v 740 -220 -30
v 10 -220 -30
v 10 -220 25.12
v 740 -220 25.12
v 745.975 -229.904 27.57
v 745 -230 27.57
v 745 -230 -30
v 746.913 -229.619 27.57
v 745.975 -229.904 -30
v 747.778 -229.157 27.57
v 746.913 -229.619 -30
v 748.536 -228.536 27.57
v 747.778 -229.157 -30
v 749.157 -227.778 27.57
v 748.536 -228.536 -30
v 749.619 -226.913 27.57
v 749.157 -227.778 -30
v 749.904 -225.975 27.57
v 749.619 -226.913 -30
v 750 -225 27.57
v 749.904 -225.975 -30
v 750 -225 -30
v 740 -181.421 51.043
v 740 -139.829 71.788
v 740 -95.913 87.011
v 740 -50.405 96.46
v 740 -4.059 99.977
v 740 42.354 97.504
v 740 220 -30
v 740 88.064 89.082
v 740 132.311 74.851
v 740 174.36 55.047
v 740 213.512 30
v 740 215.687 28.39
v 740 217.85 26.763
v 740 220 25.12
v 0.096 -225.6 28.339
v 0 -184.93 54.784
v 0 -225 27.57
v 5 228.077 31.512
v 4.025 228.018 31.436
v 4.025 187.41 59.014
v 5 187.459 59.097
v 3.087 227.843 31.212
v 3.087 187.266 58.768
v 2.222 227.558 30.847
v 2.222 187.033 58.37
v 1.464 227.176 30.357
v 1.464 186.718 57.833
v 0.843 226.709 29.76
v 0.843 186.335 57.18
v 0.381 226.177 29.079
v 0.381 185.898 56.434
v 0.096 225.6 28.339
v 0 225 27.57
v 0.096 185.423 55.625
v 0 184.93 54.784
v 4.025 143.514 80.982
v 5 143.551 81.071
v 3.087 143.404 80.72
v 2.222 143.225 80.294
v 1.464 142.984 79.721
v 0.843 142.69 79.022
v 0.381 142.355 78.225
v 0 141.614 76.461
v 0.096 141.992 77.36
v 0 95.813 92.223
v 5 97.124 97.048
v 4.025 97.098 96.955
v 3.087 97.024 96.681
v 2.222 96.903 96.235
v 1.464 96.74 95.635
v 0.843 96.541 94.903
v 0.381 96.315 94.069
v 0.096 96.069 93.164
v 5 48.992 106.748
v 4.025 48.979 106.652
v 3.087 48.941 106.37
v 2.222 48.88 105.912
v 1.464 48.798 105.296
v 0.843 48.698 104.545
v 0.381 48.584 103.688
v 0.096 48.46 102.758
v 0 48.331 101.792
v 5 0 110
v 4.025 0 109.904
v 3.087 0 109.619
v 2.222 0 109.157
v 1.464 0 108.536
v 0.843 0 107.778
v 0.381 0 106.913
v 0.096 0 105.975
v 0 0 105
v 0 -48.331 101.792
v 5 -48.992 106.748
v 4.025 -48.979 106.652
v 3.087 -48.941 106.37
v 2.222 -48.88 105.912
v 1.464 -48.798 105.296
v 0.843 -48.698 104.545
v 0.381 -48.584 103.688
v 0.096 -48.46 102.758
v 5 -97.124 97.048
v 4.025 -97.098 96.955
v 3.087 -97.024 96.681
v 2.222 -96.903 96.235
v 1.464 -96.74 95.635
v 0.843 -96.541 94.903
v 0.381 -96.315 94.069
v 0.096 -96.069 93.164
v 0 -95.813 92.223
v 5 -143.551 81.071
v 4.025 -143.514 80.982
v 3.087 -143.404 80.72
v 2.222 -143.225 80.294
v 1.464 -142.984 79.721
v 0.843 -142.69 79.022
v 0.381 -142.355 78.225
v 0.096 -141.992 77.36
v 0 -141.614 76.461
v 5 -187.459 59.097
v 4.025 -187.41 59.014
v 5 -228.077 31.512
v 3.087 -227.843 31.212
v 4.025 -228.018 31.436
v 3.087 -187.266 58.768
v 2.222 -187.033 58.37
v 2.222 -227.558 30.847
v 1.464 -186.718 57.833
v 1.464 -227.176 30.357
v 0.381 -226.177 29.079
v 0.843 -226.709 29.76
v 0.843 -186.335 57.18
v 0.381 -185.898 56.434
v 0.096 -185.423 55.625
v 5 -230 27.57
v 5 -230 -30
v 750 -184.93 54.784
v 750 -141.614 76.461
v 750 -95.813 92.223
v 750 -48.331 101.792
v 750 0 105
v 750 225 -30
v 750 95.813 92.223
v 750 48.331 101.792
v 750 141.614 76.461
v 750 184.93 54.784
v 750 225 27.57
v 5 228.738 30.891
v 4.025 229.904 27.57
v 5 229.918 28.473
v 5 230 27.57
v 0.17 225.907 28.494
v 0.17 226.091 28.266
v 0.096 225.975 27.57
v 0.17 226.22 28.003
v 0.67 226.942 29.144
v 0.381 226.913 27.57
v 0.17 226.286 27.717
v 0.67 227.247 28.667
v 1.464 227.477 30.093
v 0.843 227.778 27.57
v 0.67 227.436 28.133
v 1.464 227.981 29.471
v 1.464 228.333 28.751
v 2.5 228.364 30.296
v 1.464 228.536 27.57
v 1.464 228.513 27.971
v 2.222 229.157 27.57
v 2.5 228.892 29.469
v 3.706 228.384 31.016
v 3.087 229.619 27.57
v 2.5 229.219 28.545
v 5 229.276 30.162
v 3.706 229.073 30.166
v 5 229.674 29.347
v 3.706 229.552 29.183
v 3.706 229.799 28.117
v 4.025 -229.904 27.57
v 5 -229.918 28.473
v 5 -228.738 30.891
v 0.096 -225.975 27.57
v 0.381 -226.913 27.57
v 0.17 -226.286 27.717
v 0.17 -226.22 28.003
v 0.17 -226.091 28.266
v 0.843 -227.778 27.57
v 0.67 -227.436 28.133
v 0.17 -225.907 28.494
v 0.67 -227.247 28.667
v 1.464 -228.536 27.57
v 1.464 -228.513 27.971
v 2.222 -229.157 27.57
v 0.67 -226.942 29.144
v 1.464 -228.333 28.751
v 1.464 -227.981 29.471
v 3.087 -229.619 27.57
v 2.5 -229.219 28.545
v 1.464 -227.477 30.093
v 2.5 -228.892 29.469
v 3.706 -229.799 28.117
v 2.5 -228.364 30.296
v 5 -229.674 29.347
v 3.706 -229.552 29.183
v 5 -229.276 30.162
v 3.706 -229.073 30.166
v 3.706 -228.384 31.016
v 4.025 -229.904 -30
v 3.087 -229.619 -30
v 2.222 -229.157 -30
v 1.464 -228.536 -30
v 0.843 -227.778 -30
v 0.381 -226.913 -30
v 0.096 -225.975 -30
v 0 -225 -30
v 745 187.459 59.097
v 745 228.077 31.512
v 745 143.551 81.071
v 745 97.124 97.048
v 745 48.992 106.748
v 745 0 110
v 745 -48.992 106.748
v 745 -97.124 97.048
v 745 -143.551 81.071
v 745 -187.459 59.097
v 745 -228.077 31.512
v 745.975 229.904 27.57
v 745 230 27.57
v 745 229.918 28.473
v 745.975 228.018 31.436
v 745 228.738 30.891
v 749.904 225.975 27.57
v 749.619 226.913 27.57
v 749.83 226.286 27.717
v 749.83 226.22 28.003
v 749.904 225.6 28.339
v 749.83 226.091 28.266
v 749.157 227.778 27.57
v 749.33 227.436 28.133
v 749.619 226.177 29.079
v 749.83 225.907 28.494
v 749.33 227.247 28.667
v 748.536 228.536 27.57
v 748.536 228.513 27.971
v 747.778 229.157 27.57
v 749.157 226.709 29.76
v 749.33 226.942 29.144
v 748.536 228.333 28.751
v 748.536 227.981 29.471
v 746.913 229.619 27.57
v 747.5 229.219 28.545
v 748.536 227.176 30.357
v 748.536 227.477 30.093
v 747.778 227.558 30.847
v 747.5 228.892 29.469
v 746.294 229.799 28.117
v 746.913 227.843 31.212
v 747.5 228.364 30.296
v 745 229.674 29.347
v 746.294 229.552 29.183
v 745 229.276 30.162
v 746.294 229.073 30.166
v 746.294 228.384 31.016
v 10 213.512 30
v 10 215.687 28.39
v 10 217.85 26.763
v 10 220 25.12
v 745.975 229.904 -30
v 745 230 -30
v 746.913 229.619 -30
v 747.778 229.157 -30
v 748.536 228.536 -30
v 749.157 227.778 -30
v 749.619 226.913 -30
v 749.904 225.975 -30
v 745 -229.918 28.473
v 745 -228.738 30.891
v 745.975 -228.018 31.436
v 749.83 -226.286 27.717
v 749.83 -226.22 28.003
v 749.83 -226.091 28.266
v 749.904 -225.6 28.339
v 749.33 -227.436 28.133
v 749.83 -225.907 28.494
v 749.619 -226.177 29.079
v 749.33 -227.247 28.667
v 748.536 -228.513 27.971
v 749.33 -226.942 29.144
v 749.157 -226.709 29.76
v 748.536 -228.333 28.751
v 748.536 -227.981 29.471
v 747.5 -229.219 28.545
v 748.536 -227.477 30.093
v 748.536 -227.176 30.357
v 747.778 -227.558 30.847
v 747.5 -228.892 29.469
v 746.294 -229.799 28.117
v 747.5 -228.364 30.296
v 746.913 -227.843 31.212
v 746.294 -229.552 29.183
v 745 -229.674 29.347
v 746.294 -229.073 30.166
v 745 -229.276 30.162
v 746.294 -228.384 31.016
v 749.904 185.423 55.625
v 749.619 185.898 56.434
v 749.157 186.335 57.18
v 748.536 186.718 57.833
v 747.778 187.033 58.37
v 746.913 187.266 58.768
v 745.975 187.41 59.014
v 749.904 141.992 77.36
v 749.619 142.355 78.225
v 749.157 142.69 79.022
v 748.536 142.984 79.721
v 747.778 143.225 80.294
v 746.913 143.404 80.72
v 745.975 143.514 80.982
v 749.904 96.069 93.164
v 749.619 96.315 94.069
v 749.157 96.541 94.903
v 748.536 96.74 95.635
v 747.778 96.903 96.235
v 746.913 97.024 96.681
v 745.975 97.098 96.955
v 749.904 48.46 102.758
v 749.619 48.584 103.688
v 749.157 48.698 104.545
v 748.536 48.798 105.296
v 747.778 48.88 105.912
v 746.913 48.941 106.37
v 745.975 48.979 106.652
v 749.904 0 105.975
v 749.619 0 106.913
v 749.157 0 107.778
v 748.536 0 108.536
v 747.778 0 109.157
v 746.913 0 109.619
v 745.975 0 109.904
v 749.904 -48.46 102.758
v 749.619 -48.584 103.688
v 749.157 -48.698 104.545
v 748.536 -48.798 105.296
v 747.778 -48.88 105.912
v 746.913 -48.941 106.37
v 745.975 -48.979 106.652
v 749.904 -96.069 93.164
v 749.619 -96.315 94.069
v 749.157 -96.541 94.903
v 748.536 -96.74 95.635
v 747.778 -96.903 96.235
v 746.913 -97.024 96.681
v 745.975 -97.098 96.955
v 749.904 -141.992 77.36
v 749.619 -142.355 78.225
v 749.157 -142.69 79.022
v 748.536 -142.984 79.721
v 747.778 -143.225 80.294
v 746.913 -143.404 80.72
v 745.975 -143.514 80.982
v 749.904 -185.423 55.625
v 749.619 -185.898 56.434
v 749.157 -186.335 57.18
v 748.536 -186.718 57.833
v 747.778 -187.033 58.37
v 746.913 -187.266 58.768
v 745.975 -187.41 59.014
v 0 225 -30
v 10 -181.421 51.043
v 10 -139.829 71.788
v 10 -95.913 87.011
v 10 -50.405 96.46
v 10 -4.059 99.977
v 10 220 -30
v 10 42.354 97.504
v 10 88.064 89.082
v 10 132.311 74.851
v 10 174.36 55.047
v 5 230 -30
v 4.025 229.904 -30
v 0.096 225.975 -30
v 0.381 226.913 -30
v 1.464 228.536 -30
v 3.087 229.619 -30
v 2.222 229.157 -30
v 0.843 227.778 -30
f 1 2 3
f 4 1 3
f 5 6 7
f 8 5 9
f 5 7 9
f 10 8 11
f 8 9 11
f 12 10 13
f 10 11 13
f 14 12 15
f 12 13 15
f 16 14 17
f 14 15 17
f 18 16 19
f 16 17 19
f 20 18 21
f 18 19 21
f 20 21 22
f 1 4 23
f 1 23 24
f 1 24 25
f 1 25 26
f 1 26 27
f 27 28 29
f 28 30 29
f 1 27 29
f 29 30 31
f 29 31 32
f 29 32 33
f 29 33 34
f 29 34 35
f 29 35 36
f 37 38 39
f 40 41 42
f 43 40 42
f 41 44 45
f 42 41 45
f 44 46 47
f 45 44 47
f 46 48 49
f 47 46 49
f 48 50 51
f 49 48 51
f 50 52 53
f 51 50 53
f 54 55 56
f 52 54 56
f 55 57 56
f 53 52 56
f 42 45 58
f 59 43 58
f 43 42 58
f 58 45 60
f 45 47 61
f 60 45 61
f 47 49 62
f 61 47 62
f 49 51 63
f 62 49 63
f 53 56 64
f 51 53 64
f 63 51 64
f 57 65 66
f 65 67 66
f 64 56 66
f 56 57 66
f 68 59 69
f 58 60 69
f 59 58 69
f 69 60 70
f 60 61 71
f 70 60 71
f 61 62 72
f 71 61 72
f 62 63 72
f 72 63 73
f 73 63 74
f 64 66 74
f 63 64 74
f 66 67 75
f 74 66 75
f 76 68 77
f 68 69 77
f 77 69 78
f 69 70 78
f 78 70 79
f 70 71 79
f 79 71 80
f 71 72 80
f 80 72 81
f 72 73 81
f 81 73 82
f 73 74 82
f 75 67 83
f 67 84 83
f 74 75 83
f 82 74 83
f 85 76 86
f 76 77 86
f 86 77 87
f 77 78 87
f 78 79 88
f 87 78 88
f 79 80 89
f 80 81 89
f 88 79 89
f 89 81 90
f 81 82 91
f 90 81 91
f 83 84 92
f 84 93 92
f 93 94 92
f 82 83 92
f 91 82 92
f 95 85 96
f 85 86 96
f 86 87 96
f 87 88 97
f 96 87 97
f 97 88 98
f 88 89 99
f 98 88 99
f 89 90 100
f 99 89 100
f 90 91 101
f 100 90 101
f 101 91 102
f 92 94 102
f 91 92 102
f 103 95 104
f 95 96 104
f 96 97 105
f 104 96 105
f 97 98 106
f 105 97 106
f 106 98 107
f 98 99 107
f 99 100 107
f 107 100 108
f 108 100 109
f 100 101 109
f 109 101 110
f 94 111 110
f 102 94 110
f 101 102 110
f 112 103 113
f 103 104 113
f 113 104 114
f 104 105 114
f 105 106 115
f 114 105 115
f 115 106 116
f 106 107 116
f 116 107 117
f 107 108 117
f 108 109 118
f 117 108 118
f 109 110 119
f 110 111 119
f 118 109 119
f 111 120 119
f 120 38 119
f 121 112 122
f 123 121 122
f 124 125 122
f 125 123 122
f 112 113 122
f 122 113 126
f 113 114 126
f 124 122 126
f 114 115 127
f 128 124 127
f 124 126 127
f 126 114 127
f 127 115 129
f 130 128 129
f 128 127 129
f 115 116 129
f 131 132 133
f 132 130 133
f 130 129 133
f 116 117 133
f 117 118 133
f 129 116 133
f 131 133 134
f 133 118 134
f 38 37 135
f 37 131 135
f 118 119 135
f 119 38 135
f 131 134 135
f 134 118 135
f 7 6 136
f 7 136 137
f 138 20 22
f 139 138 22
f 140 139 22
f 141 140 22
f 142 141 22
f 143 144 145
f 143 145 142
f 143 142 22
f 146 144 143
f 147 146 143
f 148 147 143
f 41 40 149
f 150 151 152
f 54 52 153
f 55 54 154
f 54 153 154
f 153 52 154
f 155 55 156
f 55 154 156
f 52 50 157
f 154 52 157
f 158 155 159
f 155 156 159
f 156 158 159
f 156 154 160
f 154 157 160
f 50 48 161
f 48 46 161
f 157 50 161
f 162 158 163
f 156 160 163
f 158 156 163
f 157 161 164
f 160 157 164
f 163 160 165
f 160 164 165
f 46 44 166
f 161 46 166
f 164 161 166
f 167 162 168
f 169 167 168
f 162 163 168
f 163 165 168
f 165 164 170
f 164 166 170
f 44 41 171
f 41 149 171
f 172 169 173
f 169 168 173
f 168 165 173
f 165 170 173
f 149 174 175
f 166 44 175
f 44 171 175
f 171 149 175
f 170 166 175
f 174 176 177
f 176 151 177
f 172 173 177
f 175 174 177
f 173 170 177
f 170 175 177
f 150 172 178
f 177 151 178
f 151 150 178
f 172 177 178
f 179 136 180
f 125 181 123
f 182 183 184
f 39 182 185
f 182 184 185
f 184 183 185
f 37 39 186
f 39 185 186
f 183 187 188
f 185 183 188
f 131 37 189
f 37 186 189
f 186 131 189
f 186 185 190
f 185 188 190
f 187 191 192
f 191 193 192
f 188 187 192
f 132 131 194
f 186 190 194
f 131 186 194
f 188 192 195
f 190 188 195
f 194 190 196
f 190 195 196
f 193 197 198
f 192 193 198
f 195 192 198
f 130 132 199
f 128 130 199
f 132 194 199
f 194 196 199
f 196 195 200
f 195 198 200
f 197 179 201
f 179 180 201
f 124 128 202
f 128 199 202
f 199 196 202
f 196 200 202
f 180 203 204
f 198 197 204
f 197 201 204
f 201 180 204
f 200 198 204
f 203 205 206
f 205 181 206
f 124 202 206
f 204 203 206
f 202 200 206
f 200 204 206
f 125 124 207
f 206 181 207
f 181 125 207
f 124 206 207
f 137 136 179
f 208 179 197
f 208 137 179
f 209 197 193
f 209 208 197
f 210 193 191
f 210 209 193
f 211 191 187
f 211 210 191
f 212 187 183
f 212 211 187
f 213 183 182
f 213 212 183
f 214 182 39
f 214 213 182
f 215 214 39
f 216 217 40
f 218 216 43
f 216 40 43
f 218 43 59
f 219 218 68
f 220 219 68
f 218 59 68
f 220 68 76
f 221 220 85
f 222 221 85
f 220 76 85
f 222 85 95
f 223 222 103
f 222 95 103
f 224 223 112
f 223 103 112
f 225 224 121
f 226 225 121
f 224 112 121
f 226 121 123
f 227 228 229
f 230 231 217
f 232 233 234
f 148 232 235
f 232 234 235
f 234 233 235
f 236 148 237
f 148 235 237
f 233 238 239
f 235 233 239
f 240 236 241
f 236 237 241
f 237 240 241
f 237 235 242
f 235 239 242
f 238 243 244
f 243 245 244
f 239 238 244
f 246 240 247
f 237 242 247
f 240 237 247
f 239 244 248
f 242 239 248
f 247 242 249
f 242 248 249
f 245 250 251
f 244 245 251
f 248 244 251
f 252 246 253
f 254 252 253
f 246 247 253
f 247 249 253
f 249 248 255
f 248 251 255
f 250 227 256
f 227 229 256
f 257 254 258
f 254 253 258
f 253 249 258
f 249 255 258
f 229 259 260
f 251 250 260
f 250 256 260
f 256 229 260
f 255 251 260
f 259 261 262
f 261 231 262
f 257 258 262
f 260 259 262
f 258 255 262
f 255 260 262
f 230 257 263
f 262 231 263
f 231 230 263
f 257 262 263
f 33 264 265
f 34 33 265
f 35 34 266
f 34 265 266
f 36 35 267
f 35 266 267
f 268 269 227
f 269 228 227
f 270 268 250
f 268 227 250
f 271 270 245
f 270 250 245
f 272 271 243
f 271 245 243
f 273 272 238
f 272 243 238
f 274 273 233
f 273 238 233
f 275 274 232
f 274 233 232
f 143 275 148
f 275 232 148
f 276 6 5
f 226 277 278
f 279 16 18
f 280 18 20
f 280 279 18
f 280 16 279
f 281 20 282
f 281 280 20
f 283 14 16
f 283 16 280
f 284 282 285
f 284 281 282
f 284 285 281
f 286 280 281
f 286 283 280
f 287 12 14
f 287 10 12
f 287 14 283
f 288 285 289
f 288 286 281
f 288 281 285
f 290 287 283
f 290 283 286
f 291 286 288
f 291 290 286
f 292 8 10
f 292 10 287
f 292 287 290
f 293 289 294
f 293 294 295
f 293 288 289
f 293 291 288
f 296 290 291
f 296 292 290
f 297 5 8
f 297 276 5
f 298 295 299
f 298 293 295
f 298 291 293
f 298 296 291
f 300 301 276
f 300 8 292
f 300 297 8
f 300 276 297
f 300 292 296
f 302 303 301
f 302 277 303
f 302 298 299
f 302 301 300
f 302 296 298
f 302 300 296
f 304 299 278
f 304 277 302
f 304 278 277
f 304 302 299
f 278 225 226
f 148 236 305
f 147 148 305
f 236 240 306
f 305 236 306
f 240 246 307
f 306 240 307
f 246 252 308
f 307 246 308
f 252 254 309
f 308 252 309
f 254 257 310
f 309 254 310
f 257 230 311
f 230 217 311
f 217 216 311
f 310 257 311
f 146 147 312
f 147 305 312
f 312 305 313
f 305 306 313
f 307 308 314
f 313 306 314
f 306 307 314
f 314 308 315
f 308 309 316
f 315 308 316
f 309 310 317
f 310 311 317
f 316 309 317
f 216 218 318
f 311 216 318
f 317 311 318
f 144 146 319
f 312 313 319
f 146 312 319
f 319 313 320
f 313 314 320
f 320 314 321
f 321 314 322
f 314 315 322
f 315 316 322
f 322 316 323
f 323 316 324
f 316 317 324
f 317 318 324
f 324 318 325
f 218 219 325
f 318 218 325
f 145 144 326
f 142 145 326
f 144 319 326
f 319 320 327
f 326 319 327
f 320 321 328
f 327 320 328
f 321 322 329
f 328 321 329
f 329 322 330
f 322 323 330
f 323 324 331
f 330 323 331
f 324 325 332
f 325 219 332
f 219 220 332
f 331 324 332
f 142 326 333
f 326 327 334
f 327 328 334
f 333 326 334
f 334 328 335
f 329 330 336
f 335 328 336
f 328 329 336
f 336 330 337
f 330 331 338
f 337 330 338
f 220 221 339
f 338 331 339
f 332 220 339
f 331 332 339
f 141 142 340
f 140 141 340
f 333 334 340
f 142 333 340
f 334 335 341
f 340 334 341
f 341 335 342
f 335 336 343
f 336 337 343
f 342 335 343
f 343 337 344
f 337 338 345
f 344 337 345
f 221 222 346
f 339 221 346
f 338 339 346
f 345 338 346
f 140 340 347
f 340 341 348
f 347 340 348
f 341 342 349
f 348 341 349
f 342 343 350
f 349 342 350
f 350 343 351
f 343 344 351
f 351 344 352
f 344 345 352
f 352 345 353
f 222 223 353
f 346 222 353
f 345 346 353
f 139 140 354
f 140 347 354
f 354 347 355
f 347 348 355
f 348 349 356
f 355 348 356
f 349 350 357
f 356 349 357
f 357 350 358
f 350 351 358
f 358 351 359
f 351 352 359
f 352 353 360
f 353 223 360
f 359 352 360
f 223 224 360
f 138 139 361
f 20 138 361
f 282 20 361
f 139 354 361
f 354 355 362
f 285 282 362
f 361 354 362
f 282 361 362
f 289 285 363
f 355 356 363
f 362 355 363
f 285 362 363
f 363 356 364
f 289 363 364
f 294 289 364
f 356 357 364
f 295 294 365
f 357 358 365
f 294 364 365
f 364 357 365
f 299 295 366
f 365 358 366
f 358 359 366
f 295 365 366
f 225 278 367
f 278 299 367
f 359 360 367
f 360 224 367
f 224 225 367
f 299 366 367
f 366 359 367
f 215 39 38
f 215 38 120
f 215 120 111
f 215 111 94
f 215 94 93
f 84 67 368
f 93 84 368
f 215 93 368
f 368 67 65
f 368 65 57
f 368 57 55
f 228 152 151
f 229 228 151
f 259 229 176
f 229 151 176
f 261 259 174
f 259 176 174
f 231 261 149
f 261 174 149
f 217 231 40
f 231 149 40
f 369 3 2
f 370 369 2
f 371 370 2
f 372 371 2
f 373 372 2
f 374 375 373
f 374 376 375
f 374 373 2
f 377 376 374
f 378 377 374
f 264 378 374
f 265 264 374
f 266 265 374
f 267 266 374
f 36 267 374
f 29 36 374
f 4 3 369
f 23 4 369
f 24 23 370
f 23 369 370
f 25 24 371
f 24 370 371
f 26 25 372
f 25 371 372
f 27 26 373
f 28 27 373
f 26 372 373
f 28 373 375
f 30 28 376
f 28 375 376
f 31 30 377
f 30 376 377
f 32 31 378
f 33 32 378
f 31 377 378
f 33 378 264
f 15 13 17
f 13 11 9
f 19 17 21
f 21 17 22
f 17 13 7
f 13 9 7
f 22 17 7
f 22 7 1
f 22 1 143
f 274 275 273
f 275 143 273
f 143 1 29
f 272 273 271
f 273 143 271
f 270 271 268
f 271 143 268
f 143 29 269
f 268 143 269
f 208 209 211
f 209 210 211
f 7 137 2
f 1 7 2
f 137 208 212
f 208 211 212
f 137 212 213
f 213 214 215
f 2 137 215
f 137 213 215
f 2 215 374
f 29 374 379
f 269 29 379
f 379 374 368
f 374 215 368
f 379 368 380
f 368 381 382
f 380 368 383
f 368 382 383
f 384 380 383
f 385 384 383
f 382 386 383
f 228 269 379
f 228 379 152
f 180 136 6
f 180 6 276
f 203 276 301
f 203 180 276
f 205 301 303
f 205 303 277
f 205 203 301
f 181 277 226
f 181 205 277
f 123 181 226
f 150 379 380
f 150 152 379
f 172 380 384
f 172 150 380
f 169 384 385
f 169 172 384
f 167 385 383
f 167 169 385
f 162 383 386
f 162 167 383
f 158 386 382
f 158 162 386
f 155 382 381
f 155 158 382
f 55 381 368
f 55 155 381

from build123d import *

# Parameters (mm, degrees)
F1_DEPTH = 750
F2_DEPTH = 10
F6_R     = 5


# Not quite as in the source:
# - a feature of the source that left no trace in its solid (it failed there, or was rolled back) is left out


with BuildPart() as f1:
    # F0 (on Right) → F1 (new body)
    with BuildSketch(Plane.YZ):
        with BuildLine():
            Line((-213.512294728, 30), (-230, 30))
            Line((-230, 30), (-230, -30))
            Line((-230, -30), (-220, -30))
            Line((-220, -30), (-220, 25.1203247649))
            ThreePointArc((-220, 25.1203247649), (-216.7698785064, 27.5784184345), (-213.512294728, 30))
        make_face()
        with BuildLine():
            ThreePointArc((230, 30), (0, 110), (-230, 30))
            Line((-230, 30), (-213.512294728, 30))
            ThreePointArc((-213.512294728, 30), (0, 100), (213.512294728, 30))
            Line((213.512294728, 30), (230, 30))
        make_face()
        with BuildLine():
            Line((230, -30), (230, 30))
            Line((230, 30), (213.512294728, 30))
            ThreePointArc((213.512294728, 30), (216.7698785064, 27.5784184345), (220, 25.1203247649))
            Line((220, 25.1203247649), (220, -30))
            Line((220, -30), (230, -30))
        make_face()
    extrude(amount=F1_DEPTH)

    # F0 (on Right) → F2 (join)
    with BuildSketch(Plane.YZ):
        with BuildLine():
            ThreePointArc((230, 30), (0, 110), (-230, 30))
            Line((-230, 30), (-213.512294728, 30))
            ThreePointArc((-213.512294728, 30), (0, 100), (213.512294728, 30))
            Line((213.512294728, 30), (230, 30))
        make_face()
        with BuildLine():
            Line((-213.512294728, 30), (-230, 30))
            Line((-230, 30), (-230, -30))
            Line((-230, -30), (-220, -30))
            Line((-220, -30), (-220, 25.1203247649))
            ThreePointArc((-220, 25.1203247649), (-216.7698785064, 27.5784184345), (-213.512294728, 30))
        make_face()
        with BuildLine():
            Line((213.512294728, 30), (-213.512294728, 30))
            ThreePointArc((-213.512294728, 30), (-216.7698785064, 27.5784184345), (-220, 25.1203247649))
            Line((-220, 25.1203247649), (-220, -30))
            Line((-220, -30), (220, -30))
            Line((220, -30), (220, 25.1203247649))
            ThreePointArc((220, 25.1203247649), (216.7698785064, 27.5784184345), (213.512294728, 30))
        make_face()
        with BuildLine():
            ThreePointArc((213.512294728, 30), (0, 100), (-213.512294728, 30))
            Line((-213.512294728, 30), (213.512294728, 30))
        make_face()
        with BuildLine():
            Line((230, -30), (230, 30))
            Line((230, 30), (213.512294728, 30))
            ThreePointArc((213.512294728, 30), (216.7698785064, 27.5784184345), (220, 25.1203247649))
            Line((220, 25.1203247649), (220, -30))
            Line((220, -30), (230, -30))
        make_face()
    extrude(amount=F2_DEPTH)

    # F4: F1 across plane


with BuildPart() as f1_1:
    add(f1.part)
    add(f1.part.mirror(Plane.YZ.offset(375)))

    # F6
    f6_edges = [f1_1.edges().sort_by_distance(p)[0] for p in [
        (750, 0, 110),
        (375, 230, 30),
        (0, 0, 110),
        (375, -230, 30),
        (0, -230, 0),
        (750, -230, 0),
        (0, 230, 0),
        (750, 230, 0),
    ]]
    fillet(f6_edges, radius=F6_R)


solid = f1_1.part
